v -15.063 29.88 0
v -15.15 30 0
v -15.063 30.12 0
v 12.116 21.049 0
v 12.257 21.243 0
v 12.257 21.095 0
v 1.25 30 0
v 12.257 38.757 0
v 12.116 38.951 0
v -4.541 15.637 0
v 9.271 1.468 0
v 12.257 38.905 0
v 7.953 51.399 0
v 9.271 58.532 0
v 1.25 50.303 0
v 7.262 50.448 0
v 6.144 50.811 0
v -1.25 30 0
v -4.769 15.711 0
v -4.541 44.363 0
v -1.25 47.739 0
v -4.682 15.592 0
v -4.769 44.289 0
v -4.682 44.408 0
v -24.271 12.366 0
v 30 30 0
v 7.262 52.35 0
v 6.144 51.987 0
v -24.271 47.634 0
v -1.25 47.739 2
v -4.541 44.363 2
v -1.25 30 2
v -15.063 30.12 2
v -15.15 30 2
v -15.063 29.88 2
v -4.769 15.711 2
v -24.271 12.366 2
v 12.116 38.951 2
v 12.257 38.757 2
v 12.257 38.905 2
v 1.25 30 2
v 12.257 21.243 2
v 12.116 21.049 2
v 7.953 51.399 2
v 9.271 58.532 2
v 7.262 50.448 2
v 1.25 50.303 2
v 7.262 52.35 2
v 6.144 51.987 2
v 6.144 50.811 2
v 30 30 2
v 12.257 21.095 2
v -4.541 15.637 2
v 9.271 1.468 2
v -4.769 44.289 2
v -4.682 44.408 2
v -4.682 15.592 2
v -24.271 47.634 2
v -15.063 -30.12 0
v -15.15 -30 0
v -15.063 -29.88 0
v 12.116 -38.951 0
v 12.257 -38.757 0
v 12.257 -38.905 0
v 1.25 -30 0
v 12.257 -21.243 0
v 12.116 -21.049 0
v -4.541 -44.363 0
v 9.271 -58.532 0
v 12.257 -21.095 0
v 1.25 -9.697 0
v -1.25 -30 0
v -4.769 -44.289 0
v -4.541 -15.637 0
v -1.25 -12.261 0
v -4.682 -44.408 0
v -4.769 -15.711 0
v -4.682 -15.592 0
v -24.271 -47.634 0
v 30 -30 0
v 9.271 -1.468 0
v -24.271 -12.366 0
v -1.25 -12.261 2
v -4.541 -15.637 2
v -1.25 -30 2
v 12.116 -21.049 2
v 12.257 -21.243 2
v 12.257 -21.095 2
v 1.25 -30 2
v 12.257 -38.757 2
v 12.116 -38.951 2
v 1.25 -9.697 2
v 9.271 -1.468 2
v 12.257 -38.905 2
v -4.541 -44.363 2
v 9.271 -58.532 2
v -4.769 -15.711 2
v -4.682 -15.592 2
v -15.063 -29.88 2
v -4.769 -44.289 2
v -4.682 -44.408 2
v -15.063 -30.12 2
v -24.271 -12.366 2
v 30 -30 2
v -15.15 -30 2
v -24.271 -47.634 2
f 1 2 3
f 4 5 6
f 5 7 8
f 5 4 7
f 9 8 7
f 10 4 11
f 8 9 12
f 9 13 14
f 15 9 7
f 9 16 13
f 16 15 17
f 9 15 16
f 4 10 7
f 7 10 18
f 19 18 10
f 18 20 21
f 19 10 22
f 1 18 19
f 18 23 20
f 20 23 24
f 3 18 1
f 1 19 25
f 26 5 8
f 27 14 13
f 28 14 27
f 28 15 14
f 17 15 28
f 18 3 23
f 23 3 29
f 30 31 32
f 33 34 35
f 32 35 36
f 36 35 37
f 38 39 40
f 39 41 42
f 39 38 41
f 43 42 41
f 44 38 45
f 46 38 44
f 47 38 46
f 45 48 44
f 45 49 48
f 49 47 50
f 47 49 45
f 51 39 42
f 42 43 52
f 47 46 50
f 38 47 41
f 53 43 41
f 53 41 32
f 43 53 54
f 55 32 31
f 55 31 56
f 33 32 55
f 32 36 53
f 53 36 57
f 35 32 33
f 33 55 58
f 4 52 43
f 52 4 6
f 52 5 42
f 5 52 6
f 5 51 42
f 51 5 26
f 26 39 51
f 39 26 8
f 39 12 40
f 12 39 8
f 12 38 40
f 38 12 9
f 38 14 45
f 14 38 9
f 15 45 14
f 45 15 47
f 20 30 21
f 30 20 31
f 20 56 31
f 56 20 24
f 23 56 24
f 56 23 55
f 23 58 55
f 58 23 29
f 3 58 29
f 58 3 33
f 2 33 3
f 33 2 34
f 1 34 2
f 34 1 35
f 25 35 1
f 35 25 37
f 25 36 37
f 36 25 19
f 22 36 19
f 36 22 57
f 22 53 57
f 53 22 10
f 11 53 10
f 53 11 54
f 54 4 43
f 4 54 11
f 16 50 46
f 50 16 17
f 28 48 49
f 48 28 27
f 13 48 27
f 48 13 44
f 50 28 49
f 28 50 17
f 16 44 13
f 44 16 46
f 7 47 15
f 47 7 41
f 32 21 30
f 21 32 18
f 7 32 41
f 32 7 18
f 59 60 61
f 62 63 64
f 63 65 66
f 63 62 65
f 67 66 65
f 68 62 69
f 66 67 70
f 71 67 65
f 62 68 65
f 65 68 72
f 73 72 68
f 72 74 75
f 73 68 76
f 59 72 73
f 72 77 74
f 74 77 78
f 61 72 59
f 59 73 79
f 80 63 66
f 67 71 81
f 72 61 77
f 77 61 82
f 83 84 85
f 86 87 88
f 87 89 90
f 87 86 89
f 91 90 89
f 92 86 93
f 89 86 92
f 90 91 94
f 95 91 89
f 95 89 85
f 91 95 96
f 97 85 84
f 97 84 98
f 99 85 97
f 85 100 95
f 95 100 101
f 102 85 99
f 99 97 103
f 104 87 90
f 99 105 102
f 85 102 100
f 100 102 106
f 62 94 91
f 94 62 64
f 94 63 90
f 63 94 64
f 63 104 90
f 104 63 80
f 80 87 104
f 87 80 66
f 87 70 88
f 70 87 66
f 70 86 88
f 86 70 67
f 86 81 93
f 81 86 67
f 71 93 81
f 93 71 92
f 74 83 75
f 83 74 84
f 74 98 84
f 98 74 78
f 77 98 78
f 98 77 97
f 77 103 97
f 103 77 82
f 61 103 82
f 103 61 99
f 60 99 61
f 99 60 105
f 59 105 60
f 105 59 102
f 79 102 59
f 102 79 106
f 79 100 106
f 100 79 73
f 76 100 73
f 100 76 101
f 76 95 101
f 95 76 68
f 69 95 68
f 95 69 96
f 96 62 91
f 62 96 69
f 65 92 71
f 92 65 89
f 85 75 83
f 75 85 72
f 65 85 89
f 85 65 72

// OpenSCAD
// [FL_INDEX: keywords="openscad, 3d_parametric, 2_piece_parametric_star, csg_solid" | COT="Parametric OpenSCAD design from 3DCodeverse"]
// Title: 2 piece parametric star

n=6;
h=2;
ro=30;
ri=15;

//-- Parametric star
//-- (c)  2010 Juan Gonzalez-Gomez (Obijuan) juan@iearobotics.com
//-- GPL license

//-- The 2*N points of an N-ponted star are calculated as follows:
//-- There are two circunferences:  the inner and outer.  Outer points are located
//-- at angles: 0, 360/N, 360*2/N and on the outer circunference
//-- The inner points have the same angular distance but they are 360/(2*N) rotated
//-- respect to the outers. They are located on the inner circunference

//--- INPUT PARAMETERS:
//--- N: Number of points
//--  h: Height
//-- ri: Inner radius
//-- ro: outer radius
module parametric_star(N=5, h=3, ri=15, re=30) {

  //-- Calculate and draw a 2D tip of the star
 //-- INPUT: 
 //-- n: Number of the tip (from 0 to N-1)
  module tipstar(n) {
     i1 =  [ri*cos(-360*n/N+360/(N*2)), ri*sin(-360*n/N+360/(N*2))];
    e1 = [re*cos(-360*n/N), re*sin(-360*n/N)];
    i2 = [ri*cos(-360*(n+1)/N+360/(N*2)), ri*sin(-360*(n+1)/N+360/(N*2))];
    polygon([ i1, e1, i2]);
  }

  //-- Draw the 2D star and extrude
  
   //-- The star is the union of N 2D tips. 
   //-- A inner cylinder is also needed for filling
   //-- A flat (2D) star is built. The it is extruded
    linear_extrude(height=h) 
    union() {
      for (i=[0:N-1]) {
         tipstar(i);
      }
      rotate([0,0,360/(2*N)]) circle(r=ri+ri*0.01,$fn=N);
    }
}

//-- Example
n=5;
h=2;
ro=30;
ri=15;
translate([0,ro,0])
difference(){
difference()
{ parametric_star(n, h,ri,ro);
translate([cos(360/n)*0.75*ro,sin(360/n)*0.75*ro,-1]) cylinder (h+2,h/2,h/2);}
translate([-(h+0.5)/2,0,0])cube ([h+0.5,ro+2,h+0.5]);
}
translate([0,-ro,0])
difference(){
difference()
{ parametric_star(n, h,ri,ro);
translate([-(h+0.5)/2,0,0])cube ([h+0.5,ro+2,h+0.5]);
}
}
